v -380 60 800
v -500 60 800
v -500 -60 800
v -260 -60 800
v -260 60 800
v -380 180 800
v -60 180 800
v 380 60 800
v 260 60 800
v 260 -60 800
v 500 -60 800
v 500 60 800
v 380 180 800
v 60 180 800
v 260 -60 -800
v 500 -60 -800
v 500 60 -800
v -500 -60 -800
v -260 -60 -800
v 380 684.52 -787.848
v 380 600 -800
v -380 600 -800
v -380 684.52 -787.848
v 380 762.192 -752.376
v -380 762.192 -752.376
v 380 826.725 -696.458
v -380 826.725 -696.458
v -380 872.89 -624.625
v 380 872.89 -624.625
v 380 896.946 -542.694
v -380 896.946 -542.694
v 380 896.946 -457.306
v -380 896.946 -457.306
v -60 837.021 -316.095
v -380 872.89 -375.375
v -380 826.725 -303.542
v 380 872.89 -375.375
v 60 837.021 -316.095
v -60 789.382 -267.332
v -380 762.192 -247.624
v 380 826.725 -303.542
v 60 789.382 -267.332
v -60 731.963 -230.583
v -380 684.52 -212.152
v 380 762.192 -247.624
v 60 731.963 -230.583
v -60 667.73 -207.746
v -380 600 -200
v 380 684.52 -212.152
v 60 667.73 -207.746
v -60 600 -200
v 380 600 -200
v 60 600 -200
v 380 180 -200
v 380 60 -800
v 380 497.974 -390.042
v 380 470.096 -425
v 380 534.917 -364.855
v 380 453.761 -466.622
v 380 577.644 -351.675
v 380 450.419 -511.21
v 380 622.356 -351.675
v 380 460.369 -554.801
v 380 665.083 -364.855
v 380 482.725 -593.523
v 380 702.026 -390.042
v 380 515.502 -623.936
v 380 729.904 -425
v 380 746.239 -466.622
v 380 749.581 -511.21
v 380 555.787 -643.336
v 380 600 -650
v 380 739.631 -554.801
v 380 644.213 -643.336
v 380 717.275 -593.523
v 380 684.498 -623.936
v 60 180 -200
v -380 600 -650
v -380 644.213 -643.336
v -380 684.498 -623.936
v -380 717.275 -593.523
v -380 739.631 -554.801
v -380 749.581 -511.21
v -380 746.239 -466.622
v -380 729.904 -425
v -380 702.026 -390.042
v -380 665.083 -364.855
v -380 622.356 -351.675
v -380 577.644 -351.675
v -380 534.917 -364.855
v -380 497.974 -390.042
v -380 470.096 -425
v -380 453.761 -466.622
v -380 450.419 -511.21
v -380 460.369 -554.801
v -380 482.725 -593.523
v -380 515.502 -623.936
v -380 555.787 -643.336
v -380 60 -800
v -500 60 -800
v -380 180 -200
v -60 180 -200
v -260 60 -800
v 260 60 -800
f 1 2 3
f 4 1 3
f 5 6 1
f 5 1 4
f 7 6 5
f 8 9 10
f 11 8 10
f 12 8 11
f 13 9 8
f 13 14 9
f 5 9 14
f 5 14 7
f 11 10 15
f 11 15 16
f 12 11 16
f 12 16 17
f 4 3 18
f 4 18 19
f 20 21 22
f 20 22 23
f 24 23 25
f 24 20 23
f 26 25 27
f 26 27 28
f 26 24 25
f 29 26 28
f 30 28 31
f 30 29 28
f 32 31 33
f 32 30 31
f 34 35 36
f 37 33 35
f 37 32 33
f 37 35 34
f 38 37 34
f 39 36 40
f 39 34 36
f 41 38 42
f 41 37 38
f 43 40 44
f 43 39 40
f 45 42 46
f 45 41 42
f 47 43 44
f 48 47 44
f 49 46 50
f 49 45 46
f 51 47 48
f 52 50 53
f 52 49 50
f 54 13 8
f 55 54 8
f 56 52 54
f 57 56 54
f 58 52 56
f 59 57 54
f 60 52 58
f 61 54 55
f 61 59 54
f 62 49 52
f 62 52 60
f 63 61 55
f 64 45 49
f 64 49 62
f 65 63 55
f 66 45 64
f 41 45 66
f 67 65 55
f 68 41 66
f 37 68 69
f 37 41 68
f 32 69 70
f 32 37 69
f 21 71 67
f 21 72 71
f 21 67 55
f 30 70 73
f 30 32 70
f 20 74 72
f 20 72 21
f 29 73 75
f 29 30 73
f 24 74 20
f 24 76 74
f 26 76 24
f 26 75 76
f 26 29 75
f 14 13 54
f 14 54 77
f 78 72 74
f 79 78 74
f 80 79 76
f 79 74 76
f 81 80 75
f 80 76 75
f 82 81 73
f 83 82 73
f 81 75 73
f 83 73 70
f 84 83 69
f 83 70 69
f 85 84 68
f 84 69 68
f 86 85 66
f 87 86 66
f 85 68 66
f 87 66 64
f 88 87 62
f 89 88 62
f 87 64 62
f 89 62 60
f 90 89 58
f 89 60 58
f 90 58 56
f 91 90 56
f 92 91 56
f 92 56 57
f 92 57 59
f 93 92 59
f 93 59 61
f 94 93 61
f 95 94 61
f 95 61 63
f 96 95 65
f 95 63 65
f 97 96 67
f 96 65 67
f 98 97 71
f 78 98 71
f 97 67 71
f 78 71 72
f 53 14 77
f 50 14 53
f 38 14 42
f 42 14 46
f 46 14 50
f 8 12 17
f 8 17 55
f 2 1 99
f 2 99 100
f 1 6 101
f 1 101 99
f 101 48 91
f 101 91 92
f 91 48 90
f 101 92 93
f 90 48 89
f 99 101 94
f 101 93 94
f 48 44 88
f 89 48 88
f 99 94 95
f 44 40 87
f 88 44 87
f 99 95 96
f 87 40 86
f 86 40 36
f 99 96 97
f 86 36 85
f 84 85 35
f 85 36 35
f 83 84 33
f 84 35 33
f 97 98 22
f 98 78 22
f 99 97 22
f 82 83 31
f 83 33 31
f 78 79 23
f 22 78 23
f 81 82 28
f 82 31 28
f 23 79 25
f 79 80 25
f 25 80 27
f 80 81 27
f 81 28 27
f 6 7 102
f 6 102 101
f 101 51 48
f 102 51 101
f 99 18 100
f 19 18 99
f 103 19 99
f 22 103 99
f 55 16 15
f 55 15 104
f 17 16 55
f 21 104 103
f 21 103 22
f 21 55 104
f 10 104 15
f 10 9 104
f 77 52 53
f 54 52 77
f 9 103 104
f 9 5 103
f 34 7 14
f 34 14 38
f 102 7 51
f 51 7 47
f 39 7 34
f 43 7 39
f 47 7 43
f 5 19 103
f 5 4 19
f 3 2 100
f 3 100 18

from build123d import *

# Parameters (mm, degrees)
BOSS_EXTRUDE1_DEPTH = 800
SKETCH2_R           = 150
BOSS_EXTRUDE5_DEPTH = 760
RIB1_REACH          = 1305.84
SKETCH4_WALL_W      = 3904.804378638
SKETCH4_WALL_H      = 120


with BuildPart() as part:
    # Sketch1 → Boss-Extrude1 (new, symmetric)
    with BuildSketch(Plane.XY):
        Polygon((380, 60), (260, 60), (260, -60), (500, -60), (500, 60), align=None)
        Polygon((-380, 180), (-380, 60), (-260, 60), (260, 60), (380, 60), (380, 180), align=None)
        Polygon((-260, 60), (-380, 60), (-500, 60), (-500, -60), (-260, -60), align=None)
    extrude(amount=BOSS_EXTRUDE1_DEPTH, both=True)

    # Sketch2 → Boss-Extrude5 (add)
    with BuildSketch(Plane(origin=(380, 0, 0), x_dir=(0, 0, -1), z_dir=(1, 0, 0))):
        with BuildLine():
            Line((800, 180), (800, 600))
            ThreePointArc((800, 600), (500, 900), (200, 600))
            Line((200, 600), (200, 180))
            Line((200, 180), (800, 180))
        make_face()
        with Locations((500, 600)):
            Circle(SKETCH2_R, mode=Mode.SUBTRACT)
    extrude(amount=-BOSS_EXTRUDE5_DEPTH)

    # Sketch4 wall → Rib1 (add, up to next)
    with BuildSketch(Plane(origin=(0, 508.510499954, 241.952495347), x_dir=(0, 0.507303776233, -0.861767299576), z_dir=(0, 0.861767299576, 0.507303776233)), mode=Mode.PRIVATE) as rib1_sk1:
        Rectangle(SKETCH4_WALL_W, SKETCH4_WALL_H)
    rib1_tool1 = extrude(rib1_sk1.sketch, amount=-RIB1_REACH, mode=Mode.PRIVATE) - part.part
    add(rib1_tool1.solids().sort_by_distance((0, 508.510499954, 241.952495347))[0])


solid = part.part
